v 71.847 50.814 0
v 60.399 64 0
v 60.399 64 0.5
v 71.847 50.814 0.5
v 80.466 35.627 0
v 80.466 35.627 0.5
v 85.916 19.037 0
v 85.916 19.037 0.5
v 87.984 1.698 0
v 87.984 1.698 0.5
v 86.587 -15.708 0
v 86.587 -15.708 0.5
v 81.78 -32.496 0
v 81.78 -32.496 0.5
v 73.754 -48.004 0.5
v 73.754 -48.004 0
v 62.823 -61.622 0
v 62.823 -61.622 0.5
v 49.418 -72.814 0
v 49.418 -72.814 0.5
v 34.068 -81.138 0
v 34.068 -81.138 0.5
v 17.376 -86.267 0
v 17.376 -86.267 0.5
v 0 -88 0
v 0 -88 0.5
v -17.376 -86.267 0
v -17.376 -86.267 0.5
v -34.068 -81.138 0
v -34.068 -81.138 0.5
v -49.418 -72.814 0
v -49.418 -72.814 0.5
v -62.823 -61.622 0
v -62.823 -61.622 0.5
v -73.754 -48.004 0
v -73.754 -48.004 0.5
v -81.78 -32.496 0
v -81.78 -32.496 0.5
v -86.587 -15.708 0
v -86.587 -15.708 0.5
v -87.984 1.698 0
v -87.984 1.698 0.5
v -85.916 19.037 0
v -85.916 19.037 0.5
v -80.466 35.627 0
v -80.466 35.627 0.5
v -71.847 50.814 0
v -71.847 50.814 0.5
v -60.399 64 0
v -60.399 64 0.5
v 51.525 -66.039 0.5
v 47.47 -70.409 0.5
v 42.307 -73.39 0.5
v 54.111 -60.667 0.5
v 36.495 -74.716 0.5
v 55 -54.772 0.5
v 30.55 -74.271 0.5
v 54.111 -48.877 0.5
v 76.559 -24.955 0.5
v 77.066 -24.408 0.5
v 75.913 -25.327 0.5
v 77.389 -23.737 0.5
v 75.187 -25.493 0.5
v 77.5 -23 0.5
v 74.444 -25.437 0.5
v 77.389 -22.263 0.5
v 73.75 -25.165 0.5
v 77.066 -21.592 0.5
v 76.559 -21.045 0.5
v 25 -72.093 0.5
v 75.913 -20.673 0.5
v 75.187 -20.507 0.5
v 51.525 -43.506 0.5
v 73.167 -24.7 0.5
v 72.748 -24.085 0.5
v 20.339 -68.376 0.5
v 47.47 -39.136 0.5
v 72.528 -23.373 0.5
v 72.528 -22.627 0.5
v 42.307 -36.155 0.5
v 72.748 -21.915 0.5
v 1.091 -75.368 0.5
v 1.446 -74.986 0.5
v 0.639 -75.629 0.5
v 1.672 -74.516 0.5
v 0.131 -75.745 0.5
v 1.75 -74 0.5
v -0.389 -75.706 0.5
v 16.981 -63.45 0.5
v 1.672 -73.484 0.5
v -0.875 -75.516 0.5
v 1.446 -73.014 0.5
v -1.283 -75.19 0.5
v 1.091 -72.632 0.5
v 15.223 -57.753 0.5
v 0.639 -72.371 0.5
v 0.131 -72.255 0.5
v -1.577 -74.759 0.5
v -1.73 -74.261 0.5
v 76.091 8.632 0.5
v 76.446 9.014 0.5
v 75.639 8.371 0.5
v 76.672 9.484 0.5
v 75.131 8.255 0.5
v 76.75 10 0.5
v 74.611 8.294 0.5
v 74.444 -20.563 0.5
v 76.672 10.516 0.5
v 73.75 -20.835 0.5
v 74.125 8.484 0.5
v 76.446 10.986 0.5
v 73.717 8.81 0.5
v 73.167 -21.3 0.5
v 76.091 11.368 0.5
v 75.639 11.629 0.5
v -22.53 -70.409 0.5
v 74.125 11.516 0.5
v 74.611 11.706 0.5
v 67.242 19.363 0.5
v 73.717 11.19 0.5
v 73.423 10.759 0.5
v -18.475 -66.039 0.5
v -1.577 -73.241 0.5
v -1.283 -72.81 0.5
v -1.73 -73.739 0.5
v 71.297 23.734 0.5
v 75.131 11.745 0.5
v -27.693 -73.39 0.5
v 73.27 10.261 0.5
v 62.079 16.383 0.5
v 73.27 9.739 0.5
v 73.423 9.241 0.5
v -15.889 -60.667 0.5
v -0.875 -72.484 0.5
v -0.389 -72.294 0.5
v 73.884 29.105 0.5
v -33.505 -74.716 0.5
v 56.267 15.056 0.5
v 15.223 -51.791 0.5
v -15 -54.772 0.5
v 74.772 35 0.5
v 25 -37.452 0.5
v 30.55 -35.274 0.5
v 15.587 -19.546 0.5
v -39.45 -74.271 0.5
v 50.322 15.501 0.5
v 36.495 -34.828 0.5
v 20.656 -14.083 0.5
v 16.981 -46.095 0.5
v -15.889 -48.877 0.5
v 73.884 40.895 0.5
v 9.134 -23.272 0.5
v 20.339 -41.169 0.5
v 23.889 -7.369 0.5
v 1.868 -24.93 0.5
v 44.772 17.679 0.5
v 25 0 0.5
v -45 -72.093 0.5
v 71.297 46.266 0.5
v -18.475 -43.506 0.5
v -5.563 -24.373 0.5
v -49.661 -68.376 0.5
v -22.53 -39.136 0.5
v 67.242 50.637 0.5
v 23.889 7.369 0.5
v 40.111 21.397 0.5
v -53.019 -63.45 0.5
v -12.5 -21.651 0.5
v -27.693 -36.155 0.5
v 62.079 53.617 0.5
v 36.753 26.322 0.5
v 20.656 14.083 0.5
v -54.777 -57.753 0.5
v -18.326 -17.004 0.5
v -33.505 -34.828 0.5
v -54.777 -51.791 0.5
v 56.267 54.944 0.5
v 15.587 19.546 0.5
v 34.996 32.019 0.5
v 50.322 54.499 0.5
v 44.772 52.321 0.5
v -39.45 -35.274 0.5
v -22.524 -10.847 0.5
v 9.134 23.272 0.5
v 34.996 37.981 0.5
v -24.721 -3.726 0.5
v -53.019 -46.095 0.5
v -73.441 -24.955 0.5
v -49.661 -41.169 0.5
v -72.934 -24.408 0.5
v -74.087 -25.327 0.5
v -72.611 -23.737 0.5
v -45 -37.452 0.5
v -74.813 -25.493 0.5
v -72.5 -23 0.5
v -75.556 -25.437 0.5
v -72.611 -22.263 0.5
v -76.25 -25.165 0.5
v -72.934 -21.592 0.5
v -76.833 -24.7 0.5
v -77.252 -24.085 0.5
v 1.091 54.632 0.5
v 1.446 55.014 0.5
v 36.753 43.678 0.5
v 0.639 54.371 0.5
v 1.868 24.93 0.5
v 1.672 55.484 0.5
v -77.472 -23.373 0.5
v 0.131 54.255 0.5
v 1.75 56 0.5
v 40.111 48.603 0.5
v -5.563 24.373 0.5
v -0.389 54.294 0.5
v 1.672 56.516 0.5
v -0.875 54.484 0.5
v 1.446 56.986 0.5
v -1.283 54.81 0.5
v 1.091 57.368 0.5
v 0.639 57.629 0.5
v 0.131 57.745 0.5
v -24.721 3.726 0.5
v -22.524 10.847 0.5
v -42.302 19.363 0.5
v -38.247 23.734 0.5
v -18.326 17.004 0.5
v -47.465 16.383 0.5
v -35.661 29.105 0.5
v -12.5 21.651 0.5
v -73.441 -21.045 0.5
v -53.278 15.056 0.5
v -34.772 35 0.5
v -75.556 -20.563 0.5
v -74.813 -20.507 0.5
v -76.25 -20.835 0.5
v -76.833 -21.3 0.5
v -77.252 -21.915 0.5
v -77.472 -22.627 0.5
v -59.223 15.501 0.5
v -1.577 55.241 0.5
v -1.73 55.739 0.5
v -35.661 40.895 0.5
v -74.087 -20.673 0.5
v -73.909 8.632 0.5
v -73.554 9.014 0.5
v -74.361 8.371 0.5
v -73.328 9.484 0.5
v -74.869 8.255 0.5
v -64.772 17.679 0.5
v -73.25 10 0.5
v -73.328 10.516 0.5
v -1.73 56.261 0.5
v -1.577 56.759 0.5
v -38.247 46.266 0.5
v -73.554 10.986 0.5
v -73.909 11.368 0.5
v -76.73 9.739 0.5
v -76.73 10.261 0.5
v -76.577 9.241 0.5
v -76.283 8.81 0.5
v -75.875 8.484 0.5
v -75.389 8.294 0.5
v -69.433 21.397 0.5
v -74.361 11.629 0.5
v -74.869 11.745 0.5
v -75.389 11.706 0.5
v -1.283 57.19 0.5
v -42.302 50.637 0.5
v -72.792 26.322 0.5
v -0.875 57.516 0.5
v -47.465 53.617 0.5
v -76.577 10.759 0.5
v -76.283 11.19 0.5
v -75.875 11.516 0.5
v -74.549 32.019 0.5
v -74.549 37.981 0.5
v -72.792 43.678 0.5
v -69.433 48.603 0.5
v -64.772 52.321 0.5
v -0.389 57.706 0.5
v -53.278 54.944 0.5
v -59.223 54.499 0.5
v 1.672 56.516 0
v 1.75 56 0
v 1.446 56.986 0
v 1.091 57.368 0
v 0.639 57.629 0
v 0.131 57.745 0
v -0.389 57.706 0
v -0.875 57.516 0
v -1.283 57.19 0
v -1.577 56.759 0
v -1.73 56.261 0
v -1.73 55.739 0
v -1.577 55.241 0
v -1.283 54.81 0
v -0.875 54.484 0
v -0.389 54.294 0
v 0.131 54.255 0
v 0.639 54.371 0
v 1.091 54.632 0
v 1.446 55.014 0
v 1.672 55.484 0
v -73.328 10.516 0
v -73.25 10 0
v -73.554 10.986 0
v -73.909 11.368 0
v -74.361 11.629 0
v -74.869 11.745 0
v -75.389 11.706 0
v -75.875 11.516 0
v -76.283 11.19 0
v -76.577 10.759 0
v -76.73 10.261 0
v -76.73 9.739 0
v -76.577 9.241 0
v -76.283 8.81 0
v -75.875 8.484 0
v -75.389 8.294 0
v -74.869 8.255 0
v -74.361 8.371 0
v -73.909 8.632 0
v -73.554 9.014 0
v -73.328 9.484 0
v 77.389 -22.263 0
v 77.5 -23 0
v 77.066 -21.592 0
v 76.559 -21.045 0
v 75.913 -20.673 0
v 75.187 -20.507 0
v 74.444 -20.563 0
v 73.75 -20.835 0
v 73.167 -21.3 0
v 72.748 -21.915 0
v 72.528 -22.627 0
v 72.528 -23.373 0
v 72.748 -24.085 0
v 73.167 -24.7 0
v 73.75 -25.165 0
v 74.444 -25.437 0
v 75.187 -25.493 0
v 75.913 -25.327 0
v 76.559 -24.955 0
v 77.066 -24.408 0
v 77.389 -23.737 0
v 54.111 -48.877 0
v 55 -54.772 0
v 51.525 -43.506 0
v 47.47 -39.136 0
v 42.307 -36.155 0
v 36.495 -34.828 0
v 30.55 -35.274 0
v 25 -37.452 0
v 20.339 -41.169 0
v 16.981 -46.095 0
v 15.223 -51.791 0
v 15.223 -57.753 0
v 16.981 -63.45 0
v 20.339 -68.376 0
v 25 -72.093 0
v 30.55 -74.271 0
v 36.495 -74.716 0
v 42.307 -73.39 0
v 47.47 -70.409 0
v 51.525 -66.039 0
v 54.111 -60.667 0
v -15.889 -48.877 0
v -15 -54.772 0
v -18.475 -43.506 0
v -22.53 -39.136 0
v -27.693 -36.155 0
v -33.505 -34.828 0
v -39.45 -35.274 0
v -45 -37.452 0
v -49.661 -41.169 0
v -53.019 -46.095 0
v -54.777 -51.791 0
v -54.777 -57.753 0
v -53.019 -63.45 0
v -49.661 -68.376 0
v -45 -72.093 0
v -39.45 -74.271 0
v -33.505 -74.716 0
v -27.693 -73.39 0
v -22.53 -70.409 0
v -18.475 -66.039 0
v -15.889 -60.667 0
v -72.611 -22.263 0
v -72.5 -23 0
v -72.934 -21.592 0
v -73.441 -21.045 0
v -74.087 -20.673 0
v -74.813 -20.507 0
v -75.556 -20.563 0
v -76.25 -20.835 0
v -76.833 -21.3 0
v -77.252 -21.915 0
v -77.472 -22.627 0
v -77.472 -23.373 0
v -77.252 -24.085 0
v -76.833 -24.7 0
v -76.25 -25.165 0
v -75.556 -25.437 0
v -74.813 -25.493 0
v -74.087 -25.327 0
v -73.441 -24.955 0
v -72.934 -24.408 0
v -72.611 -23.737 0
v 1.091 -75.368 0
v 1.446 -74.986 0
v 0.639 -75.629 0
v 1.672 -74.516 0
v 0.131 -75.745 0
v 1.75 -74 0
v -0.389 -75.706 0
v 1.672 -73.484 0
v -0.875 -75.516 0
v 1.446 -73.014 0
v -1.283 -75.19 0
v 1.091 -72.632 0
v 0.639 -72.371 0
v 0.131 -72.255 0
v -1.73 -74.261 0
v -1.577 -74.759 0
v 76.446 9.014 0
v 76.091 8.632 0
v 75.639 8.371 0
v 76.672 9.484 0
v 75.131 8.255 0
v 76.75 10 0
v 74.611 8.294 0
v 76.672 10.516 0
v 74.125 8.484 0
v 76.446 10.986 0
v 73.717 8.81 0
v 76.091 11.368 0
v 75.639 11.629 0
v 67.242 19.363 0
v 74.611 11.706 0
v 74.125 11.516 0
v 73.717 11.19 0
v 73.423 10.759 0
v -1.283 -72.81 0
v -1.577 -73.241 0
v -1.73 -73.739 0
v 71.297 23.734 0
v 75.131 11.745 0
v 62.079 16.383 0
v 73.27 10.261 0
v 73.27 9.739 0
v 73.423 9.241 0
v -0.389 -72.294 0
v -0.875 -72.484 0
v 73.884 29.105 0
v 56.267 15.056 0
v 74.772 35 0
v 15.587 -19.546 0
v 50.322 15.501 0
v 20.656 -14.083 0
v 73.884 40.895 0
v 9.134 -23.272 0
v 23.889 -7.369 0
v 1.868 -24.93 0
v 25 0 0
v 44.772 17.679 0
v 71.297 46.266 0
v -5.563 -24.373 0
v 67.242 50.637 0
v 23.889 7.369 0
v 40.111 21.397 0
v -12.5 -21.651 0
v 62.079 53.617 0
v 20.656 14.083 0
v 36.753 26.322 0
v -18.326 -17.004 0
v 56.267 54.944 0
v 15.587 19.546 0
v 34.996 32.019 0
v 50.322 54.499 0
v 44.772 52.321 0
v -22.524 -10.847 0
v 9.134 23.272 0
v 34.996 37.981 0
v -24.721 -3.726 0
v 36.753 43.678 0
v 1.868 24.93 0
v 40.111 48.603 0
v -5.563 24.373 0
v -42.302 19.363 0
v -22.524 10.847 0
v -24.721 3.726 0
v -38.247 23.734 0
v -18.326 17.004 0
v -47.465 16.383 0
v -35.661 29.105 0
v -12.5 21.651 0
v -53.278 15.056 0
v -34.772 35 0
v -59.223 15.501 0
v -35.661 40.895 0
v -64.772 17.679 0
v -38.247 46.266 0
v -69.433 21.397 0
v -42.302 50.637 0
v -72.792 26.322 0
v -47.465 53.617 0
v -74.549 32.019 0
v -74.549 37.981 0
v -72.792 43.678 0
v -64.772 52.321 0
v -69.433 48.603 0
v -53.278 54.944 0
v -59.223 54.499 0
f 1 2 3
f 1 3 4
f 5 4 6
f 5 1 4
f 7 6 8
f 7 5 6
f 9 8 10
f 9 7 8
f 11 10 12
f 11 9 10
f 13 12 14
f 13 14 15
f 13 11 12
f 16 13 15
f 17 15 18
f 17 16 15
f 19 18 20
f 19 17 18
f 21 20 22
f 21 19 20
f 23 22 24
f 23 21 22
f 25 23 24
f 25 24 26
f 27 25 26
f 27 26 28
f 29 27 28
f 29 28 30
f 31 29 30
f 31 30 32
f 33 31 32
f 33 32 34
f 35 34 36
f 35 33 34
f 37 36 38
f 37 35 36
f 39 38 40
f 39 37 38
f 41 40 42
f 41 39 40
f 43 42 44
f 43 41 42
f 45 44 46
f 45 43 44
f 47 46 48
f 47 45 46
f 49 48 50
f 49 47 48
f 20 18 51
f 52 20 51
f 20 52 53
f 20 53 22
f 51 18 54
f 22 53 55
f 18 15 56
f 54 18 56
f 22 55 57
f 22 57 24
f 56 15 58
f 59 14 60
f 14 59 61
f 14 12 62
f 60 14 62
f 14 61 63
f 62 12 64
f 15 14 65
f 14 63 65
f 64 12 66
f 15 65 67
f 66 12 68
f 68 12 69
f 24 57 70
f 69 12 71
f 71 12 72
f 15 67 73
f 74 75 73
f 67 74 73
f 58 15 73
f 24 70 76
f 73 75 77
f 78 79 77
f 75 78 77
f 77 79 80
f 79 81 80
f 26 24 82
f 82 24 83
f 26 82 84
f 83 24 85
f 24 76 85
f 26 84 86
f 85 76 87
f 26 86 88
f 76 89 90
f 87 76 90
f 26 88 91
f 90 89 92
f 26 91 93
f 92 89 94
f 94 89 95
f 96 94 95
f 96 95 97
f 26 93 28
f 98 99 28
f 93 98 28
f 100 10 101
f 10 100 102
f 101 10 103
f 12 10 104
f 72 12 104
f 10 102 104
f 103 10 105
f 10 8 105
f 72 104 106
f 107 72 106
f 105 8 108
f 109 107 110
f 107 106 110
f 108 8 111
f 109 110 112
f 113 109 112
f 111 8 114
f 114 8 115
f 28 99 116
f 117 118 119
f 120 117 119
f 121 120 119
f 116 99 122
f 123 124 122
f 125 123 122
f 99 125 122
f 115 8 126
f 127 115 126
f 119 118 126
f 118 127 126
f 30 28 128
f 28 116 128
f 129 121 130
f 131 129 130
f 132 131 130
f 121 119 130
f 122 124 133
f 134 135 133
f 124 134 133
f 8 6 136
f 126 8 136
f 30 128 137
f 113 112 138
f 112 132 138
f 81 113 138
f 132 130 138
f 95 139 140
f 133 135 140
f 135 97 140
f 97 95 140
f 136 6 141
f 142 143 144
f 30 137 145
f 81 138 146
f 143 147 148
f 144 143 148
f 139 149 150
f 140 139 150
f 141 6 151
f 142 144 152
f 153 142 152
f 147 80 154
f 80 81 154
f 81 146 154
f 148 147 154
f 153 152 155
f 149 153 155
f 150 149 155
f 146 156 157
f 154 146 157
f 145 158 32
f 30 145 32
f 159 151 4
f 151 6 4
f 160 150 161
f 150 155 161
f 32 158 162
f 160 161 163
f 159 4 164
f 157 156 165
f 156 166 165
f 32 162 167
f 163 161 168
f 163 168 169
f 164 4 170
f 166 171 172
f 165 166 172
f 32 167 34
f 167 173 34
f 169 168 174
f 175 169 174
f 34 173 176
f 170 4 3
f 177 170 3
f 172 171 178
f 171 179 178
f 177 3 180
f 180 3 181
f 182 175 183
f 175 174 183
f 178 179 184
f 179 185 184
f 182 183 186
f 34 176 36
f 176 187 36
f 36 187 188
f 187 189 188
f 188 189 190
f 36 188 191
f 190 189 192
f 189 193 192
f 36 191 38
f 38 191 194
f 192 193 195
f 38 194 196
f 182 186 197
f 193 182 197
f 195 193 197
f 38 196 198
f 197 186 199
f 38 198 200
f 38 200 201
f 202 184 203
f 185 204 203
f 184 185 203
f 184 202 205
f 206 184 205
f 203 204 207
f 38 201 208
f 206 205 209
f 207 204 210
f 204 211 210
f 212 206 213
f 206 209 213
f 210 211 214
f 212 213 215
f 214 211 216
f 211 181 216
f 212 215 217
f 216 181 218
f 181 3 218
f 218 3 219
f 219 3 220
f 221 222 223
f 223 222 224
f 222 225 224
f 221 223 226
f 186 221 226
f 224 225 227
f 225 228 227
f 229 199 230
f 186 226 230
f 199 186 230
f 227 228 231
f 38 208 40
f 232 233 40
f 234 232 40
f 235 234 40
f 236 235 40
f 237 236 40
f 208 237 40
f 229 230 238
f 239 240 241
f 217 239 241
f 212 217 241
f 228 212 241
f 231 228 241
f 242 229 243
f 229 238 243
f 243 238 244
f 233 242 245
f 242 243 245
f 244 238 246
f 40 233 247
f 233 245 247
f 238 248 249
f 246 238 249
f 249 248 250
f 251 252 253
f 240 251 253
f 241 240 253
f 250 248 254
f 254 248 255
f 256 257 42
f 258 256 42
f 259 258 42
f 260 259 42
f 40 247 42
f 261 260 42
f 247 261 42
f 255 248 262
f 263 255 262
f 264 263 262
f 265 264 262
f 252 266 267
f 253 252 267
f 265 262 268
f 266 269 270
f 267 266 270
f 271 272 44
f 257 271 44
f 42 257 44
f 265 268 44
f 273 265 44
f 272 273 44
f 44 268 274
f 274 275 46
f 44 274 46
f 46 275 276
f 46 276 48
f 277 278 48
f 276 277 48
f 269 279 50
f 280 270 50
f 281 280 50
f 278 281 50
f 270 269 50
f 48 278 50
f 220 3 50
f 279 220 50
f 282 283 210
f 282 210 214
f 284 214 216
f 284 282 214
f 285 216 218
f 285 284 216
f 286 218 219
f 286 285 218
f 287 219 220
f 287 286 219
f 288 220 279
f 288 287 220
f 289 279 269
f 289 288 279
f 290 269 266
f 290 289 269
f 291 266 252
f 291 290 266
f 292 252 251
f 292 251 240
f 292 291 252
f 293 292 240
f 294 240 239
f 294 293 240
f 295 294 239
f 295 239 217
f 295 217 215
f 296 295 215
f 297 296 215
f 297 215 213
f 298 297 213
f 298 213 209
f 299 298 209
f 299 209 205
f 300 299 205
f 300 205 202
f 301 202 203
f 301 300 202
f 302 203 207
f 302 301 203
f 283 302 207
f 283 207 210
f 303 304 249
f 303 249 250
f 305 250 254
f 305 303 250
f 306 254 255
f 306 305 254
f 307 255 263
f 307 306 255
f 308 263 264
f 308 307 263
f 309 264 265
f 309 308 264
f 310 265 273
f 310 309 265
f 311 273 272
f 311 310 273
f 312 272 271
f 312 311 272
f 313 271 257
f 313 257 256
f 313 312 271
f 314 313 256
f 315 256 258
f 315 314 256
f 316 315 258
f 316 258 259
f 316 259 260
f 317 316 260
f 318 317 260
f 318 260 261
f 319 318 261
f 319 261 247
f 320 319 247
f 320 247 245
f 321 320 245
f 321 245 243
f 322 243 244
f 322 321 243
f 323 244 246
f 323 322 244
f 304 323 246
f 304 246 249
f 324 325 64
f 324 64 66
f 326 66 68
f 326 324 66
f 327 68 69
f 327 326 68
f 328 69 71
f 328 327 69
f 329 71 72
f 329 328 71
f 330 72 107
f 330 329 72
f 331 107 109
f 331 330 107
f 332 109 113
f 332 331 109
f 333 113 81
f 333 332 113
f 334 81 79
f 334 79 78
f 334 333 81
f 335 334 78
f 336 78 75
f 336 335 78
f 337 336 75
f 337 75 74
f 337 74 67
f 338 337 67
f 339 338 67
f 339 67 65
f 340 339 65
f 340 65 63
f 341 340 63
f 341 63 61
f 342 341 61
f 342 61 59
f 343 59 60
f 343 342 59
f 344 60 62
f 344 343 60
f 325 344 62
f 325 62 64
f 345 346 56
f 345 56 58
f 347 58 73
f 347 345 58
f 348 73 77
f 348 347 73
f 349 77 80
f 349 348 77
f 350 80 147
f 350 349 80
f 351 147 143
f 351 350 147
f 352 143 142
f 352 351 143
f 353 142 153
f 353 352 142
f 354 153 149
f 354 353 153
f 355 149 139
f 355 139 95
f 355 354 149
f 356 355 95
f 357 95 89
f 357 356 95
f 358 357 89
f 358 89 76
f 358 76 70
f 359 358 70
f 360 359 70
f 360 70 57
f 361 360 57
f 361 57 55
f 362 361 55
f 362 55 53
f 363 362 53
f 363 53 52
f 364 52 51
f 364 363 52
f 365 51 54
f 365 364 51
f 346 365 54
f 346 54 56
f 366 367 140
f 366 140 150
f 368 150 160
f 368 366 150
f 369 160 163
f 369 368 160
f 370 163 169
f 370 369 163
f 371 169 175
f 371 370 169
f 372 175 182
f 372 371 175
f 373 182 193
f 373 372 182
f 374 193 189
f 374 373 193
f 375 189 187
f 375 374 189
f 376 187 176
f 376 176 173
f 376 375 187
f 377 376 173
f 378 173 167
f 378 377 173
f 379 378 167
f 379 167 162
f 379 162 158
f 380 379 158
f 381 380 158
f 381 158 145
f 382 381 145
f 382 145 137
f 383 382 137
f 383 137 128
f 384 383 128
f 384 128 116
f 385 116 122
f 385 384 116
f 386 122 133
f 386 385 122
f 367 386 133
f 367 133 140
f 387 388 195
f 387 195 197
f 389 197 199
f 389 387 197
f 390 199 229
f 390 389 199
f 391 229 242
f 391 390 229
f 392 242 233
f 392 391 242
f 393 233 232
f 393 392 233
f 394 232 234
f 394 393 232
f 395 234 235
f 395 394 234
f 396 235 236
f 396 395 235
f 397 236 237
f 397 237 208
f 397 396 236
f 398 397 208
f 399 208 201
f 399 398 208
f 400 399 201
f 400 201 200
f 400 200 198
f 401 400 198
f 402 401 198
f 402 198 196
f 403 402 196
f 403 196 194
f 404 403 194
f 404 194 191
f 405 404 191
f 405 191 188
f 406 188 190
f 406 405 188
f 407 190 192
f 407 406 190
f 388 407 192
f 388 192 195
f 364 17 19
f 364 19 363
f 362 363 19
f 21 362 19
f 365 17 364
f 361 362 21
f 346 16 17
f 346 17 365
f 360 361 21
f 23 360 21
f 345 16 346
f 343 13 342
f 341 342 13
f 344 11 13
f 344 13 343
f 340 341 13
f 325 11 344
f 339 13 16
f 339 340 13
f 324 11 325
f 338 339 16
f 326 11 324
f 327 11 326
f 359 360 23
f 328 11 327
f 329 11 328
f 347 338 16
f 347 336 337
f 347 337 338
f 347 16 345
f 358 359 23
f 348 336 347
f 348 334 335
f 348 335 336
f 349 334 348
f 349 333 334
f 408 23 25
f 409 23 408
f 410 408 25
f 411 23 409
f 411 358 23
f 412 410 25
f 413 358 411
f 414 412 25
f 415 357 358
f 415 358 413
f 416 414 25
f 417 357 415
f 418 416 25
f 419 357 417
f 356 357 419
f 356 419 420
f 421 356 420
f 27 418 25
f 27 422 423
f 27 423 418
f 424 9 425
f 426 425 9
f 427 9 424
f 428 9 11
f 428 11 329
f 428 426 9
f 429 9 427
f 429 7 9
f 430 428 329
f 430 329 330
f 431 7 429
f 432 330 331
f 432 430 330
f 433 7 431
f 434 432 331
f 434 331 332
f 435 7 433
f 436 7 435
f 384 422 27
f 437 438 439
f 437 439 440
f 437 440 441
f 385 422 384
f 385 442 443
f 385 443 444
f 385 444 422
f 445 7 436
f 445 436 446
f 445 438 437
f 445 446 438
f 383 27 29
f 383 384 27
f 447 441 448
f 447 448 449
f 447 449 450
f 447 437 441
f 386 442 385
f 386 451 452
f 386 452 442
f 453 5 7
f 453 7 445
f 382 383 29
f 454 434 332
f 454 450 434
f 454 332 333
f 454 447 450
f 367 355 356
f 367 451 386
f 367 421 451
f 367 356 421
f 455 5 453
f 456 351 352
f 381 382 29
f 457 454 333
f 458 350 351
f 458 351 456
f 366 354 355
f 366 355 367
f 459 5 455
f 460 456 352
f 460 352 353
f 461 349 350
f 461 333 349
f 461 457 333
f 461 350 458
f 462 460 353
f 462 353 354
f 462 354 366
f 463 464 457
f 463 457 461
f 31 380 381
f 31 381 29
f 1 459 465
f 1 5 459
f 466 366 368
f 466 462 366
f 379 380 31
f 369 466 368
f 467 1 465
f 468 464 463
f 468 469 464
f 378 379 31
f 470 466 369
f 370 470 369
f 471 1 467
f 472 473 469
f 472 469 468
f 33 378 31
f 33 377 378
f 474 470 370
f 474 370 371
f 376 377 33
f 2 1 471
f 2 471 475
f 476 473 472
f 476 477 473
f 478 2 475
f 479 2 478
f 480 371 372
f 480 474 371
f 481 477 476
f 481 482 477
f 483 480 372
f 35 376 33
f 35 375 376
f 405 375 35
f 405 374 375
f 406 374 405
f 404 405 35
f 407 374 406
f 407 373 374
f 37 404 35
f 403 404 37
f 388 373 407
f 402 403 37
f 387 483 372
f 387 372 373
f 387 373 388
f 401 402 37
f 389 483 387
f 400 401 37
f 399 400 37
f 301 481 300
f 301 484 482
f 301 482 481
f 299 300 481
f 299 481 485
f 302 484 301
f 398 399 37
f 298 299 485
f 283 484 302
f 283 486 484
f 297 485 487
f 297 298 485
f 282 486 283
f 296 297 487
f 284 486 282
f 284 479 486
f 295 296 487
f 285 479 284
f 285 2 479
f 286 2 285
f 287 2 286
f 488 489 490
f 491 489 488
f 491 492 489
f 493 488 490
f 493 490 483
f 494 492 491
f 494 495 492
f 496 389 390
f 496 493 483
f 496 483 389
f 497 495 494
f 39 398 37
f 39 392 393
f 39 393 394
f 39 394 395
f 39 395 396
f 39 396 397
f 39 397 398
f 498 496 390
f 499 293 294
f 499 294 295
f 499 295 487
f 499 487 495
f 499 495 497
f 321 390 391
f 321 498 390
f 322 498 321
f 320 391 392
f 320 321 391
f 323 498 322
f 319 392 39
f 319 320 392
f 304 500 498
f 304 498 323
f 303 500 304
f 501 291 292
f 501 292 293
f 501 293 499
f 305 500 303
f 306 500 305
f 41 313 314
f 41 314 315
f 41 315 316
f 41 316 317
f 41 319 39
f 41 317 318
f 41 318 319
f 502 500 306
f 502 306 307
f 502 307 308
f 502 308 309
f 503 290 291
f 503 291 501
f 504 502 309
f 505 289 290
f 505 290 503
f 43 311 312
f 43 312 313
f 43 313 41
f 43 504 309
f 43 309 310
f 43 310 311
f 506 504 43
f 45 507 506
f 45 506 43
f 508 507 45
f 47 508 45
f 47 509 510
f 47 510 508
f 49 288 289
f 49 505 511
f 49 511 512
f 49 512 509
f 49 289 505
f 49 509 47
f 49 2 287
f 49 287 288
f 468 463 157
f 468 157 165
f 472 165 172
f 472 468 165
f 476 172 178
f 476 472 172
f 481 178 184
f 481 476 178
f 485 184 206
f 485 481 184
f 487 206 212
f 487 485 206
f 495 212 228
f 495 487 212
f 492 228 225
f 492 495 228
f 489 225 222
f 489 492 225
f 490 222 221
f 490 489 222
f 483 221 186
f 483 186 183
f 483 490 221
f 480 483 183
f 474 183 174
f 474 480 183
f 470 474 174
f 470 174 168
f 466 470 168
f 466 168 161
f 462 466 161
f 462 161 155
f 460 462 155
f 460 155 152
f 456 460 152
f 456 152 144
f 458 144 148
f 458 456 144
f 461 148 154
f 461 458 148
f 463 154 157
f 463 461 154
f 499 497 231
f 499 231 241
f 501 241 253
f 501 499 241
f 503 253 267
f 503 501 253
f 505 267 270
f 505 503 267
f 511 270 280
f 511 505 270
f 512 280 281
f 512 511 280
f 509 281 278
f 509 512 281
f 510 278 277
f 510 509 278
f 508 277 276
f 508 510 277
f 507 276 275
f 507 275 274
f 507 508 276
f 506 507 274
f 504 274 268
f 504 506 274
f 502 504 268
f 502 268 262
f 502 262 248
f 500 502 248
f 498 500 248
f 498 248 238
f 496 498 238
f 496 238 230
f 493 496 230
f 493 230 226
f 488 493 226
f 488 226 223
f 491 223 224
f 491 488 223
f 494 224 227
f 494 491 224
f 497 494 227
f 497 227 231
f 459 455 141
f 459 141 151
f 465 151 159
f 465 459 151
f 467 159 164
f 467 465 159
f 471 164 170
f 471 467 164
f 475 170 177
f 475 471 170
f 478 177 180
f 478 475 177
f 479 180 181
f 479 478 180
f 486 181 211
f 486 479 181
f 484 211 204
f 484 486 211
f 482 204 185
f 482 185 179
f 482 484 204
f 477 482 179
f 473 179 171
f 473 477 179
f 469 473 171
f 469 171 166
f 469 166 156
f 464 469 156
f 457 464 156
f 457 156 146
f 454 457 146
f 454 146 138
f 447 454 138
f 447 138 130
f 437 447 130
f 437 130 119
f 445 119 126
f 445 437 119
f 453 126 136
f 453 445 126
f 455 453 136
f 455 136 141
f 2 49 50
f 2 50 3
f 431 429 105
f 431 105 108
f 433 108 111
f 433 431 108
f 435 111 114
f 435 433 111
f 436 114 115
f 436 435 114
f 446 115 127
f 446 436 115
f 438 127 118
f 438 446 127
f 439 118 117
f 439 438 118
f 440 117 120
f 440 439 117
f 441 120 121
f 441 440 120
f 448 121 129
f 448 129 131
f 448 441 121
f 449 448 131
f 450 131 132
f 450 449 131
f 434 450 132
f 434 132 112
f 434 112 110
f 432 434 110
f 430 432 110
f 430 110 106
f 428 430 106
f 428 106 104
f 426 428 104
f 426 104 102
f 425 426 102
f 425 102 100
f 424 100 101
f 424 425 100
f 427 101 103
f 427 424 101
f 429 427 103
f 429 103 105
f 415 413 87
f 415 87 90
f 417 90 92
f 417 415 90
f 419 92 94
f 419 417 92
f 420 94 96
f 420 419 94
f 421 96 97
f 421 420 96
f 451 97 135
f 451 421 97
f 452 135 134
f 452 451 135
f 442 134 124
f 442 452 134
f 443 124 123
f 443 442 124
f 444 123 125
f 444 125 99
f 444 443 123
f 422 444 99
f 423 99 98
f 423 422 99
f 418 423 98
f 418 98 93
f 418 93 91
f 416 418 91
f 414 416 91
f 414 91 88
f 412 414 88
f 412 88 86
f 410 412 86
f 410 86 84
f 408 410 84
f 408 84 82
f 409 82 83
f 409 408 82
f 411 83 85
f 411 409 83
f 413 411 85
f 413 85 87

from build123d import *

# Parameters (mm, degrees)
SKETCH1_R      = 25
SKETCH1_R_2    = 20
SKETCH1_R_3    = 1.75
SKETCH1_R_4    = 2.5
EXTRUDE1_DEPTH = 0.5


with BuildPart() as part:
    # Sketch1 → Extrude1 (new body)
    with BuildSketch(Plane.XY):
        with BuildLine():
            Line((-60.398675482, 64), (60.398675482, 64))
            ThreePointArc((60.398675482, 64), (0, -88), (-60.398675482, 64))
        make_face()
        Circle(SKETCH1_R, mode=Mode.SUBTRACT)
        with Locations((-35, -54.772255751)):
            Circle(SKETCH1_R_2, mode=Mode.SUBTRACT)
        with Locations((-54.772255751, 35)):
            Circle(SKETCH1_R_2, mode=Mode.SUBTRACT)
        with Locations((54.772255751, 35)):
            Circle(SKETCH1_R_2, mode=Mode.SUBTRACT)
        with Locations((35, -54.772255751)):
            Circle(SKETCH1_R_2, mode=Mode.SUBTRACT)
        with Locations((-75, 10)):
            Circle(SKETCH1_R_3, mode=Mode.SUBTRACT)
        with Locations((0, 56)):
            Circle(SKETCH1_R_3, mode=Mode.SUBTRACT)
        with Locations((0, -74)):
            Circle(SKETCH1_R_3, mode=Mode.SUBTRACT)
        with Locations((75, 10)):
            Circle(SKETCH1_R_3, mode=Mode.SUBTRACT)
        with Locations((-75, -23)):
            Circle(SKETCH1_R_4, mode=Mode.SUBTRACT)
        with Locations((75, -23)):
            Circle(SKETCH1_R_4, mode=Mode.SUBTRACT)
    extrude(amount=EXTRUDE1_DEPTH)


solid = part.part
